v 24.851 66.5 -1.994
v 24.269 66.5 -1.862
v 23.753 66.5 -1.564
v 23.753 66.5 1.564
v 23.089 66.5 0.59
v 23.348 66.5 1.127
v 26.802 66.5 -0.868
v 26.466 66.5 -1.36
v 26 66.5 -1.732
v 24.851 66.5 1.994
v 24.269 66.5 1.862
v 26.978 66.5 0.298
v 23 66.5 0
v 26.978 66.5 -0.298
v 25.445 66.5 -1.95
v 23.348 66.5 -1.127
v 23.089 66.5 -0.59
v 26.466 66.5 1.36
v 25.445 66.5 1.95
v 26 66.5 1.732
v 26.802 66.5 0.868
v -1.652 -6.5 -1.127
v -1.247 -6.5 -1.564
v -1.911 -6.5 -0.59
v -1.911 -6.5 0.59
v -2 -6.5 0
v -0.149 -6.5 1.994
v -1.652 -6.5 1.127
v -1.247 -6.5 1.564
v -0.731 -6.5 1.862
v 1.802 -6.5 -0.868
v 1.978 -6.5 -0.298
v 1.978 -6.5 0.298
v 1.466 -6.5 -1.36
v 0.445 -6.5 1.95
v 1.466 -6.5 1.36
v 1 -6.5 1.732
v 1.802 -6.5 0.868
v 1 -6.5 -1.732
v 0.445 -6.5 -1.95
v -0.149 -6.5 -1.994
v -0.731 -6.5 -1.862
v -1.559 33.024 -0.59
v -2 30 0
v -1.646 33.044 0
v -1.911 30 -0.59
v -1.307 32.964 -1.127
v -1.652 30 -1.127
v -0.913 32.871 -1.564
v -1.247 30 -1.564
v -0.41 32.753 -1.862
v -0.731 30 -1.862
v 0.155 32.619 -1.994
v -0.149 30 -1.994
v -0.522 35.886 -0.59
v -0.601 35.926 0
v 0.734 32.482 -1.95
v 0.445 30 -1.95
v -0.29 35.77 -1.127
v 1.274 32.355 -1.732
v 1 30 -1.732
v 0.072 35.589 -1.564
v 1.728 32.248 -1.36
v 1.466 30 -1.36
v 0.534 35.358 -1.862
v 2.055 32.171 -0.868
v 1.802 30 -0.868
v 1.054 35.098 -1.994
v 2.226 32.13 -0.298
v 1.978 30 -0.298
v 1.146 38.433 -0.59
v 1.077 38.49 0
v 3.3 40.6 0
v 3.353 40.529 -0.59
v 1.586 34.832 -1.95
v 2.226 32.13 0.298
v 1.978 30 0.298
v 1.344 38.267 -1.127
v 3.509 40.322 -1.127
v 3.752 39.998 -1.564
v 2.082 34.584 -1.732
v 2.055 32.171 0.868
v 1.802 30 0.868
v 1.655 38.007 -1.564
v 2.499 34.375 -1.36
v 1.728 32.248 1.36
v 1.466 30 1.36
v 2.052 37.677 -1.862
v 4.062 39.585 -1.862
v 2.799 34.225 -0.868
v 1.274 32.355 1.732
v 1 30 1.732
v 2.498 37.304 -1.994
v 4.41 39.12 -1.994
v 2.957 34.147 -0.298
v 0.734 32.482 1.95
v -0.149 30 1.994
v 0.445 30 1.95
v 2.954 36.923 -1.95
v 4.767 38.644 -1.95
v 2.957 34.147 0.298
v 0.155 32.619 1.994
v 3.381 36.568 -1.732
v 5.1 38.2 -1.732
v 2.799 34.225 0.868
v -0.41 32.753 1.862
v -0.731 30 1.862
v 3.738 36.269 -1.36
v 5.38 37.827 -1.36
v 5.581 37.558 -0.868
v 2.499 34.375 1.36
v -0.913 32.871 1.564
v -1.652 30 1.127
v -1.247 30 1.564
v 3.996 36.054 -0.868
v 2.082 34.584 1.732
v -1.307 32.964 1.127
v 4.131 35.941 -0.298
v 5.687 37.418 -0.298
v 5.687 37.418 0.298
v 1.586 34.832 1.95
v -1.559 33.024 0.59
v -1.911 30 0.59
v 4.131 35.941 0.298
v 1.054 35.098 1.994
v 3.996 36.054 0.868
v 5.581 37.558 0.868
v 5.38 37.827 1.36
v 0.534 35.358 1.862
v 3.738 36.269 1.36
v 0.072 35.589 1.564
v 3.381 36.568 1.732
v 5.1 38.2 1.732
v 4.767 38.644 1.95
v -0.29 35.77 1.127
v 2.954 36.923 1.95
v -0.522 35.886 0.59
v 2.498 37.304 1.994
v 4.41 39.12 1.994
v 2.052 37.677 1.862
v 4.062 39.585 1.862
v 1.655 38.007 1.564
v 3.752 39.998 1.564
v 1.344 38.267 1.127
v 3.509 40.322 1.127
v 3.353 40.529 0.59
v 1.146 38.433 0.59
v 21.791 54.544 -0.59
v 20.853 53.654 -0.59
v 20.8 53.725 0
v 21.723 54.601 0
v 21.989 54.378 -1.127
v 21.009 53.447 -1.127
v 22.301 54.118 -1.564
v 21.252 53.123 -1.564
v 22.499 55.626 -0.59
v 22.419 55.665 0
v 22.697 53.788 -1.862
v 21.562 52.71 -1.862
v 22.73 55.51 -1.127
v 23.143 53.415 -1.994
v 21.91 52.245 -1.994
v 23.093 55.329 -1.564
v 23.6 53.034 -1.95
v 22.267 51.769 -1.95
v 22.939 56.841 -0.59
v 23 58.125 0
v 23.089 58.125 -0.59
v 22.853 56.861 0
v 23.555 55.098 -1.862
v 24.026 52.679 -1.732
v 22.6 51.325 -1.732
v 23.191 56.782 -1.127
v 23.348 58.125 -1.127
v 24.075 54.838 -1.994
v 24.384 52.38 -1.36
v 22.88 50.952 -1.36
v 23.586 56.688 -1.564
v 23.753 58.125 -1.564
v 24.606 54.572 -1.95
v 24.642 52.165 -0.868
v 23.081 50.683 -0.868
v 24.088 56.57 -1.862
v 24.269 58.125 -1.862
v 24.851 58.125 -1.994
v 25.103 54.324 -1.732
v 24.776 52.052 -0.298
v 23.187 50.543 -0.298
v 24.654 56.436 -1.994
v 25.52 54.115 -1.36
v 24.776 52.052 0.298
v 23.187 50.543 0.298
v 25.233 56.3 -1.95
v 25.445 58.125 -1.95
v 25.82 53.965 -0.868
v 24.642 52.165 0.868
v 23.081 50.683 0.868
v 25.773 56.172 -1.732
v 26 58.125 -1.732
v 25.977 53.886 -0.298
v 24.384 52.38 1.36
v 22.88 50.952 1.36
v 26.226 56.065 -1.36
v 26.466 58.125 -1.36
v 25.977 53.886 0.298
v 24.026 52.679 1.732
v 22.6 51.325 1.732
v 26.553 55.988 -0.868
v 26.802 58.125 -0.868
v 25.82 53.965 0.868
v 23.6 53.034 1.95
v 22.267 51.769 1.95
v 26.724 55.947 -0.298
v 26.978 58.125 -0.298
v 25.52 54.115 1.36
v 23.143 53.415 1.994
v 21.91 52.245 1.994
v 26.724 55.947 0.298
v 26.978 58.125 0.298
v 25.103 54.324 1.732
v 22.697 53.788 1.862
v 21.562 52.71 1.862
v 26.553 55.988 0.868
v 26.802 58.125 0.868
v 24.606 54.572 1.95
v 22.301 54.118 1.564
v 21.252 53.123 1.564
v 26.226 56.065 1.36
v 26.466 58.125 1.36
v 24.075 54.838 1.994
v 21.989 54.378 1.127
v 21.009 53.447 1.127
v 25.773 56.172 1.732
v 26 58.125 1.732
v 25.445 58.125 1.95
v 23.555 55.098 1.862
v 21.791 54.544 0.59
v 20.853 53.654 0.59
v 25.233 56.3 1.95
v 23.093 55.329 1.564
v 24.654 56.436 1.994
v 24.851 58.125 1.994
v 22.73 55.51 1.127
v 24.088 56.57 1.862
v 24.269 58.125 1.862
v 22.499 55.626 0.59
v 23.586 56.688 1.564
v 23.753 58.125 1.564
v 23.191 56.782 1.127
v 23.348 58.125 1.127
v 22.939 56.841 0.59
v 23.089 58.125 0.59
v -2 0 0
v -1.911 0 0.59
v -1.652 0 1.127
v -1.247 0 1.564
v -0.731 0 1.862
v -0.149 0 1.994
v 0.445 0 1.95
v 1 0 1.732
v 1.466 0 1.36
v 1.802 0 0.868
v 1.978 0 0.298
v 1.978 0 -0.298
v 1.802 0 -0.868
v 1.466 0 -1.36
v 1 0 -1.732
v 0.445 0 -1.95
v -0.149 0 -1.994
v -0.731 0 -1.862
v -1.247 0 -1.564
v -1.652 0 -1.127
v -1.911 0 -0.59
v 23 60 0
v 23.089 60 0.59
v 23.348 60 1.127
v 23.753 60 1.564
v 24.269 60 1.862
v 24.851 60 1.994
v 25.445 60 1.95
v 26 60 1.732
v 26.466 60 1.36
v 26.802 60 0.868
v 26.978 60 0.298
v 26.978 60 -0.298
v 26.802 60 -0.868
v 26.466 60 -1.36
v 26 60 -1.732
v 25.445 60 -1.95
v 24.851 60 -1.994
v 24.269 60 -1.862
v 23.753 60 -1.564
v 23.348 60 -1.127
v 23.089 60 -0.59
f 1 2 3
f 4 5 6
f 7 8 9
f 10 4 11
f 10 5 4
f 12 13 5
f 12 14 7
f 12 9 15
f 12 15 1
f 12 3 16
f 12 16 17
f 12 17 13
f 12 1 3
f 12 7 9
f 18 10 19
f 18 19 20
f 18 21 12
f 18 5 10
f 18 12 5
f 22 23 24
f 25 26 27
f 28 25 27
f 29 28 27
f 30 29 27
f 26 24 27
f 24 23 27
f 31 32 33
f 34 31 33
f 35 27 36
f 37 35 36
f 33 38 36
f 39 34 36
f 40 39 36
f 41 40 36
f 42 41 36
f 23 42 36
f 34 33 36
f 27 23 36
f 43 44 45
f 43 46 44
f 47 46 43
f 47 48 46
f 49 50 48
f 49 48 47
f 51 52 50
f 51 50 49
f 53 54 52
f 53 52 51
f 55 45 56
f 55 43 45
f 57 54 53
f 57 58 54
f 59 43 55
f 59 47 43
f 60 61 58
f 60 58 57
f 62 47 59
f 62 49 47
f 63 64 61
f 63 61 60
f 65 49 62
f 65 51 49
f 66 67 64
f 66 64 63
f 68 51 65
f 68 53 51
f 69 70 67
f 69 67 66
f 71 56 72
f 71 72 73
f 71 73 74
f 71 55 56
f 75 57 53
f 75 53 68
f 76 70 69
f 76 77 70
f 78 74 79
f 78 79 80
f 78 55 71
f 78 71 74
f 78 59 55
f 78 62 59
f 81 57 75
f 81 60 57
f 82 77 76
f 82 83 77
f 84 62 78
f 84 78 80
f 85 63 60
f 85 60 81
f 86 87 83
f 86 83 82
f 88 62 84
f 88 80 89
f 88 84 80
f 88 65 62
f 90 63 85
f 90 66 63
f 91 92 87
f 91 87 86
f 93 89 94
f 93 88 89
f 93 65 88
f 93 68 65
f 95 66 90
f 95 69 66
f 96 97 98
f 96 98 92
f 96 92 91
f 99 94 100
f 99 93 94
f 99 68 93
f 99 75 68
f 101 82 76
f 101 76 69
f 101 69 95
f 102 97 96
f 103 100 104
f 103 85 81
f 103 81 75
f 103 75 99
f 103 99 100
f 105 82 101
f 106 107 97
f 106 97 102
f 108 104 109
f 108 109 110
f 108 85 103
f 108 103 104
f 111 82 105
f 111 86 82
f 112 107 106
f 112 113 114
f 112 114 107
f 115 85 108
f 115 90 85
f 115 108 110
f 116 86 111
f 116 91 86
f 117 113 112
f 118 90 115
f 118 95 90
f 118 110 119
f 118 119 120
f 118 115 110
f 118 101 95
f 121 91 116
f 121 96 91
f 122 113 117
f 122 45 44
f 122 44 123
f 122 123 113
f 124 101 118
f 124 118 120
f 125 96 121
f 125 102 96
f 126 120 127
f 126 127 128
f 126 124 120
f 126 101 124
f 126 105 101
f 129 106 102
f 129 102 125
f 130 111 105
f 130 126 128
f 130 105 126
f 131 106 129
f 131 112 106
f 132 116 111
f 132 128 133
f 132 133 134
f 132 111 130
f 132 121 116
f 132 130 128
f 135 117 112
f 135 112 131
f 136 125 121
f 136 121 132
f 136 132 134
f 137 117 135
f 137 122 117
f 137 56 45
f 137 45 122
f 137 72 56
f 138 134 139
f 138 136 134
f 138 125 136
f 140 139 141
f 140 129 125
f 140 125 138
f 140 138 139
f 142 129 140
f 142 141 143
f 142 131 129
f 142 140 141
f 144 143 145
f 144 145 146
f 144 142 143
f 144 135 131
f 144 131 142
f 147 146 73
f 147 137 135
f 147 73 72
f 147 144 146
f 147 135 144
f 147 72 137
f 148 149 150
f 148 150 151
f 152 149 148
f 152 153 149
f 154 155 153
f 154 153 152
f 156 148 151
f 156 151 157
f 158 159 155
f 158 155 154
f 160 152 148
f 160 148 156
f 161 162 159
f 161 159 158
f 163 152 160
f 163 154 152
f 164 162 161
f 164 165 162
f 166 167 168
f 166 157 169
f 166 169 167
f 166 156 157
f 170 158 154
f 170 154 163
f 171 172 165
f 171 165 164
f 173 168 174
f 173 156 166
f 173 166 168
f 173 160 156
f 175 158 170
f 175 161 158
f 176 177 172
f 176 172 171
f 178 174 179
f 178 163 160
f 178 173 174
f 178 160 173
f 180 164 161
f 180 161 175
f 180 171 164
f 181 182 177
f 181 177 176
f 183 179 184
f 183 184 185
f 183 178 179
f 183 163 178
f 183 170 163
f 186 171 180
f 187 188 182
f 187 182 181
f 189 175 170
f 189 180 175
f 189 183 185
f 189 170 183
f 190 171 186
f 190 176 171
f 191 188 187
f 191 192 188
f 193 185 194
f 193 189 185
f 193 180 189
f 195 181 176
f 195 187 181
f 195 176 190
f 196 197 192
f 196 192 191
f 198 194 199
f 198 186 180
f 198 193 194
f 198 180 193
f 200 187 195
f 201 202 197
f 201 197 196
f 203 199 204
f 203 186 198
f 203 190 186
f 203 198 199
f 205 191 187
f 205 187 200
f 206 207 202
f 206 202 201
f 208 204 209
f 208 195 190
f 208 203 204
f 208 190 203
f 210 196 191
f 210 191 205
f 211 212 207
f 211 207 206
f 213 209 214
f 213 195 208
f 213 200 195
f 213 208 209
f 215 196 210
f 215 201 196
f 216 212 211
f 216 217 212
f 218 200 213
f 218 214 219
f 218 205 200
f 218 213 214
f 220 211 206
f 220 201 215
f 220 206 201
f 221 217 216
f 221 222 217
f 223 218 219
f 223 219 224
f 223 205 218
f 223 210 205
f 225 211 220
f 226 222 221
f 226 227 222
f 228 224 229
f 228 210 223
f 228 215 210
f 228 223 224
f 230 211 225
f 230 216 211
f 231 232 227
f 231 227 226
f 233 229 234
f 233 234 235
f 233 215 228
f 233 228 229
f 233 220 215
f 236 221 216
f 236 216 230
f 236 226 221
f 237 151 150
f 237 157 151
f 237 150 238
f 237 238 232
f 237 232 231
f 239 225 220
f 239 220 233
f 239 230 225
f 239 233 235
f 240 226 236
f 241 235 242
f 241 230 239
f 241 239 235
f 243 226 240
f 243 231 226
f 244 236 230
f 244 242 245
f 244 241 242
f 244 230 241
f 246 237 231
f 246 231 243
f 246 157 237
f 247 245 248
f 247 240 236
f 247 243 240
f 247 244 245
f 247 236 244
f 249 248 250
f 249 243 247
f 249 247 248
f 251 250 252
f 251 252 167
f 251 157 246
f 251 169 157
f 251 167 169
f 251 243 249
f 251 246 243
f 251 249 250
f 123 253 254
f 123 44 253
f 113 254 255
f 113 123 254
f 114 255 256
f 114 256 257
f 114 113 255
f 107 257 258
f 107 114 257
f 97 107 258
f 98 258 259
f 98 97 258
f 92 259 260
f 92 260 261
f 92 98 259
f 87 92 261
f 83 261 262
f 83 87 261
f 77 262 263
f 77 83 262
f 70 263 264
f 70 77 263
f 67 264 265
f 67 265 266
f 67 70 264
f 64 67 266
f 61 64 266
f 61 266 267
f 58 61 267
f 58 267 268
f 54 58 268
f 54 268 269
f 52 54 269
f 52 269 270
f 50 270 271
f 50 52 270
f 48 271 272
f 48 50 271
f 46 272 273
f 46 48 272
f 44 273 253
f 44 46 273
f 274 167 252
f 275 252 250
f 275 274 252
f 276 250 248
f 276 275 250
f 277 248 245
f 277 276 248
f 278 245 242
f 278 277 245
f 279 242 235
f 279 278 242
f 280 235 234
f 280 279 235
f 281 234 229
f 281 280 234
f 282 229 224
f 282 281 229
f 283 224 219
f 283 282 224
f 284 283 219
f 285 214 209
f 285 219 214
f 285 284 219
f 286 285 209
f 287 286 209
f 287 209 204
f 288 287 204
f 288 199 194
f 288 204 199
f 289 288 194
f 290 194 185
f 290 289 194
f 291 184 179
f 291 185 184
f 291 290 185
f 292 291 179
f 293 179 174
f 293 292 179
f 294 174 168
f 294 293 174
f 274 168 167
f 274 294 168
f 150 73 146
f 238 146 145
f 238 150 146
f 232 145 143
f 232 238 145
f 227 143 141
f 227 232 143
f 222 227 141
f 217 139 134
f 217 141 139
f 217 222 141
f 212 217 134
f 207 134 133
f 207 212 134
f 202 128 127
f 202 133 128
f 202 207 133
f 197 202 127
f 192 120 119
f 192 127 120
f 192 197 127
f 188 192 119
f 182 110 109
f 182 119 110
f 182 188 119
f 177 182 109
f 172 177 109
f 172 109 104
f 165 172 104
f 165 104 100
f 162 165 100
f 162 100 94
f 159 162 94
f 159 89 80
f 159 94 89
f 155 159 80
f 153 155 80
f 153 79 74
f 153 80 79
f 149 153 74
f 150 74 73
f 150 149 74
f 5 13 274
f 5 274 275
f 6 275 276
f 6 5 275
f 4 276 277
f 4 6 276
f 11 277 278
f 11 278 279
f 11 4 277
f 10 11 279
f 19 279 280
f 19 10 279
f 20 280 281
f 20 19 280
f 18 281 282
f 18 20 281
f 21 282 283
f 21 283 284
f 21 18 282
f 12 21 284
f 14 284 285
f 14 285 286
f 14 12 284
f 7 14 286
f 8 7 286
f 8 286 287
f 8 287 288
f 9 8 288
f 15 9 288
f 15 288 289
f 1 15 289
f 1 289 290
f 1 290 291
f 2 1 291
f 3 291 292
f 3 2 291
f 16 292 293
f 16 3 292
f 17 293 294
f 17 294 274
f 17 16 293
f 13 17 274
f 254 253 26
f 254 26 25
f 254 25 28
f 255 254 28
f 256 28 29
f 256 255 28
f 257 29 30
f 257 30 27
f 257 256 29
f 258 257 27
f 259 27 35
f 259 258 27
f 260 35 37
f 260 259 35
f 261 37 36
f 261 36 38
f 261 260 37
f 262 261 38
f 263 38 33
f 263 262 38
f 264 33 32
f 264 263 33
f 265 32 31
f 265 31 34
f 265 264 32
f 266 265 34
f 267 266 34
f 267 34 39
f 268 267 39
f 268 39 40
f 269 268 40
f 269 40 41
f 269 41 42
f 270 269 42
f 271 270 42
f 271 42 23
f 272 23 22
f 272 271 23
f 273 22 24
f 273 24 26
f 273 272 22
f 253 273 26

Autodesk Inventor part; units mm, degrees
ref_plane "YZ Plane" through (0, 0, 0) normal (1, 0, 0) x (0, 1, 0)
ref_plane "XZ Plane" through (0, 0, 0) normal (0, 1, 0) x (-1, 0, 0)
ref_plane "XY Plane" through (0, 0, 0) normal (0, 0, 1) x (1, 0, 0)
sketch "Skizze1" plane through (0, 0, 0) normal (0, 0, 1) x (1, 0, 0)
  line L0 (0, 0) -> (0, 30)
  arc A0 (4.5, 39) -> (0, 30) centre (11.25, 30) ccw
  line L1 (4.5, 39) -> (22, 52.125)
  arc A1 (22, 52.125) -> (25, 58.125) centre (17.5, 58.125) ccw
  line L2 (25, 58.125) -> (25, 60)
  line L3 (25, 60) -> (25, 66.5)
  line L4 (0, 0) -> (0, -6.5)
  dimension "d4" = 30
  dimension "d5" = 60
  dimension "d6" = 25
  dimension "d16" = 4.5
  dimension "d17" = 9
  dimension "d18" = 3
  dimension "d19" = 6.5
  dimension "d20" = 6.5
sketch "Skizze2" plane through (0, 0, 0) normal (0, 1, 0) x (-1, 0, 0)
  circle A0 centre (0, 0) radius 2
  dimension "d1" = 4
sweep "Sweeping1" add profiles "Skizze2" path "Skizze1"
equation "\"d20\" = d19"
properties part number "rear iron bar"
